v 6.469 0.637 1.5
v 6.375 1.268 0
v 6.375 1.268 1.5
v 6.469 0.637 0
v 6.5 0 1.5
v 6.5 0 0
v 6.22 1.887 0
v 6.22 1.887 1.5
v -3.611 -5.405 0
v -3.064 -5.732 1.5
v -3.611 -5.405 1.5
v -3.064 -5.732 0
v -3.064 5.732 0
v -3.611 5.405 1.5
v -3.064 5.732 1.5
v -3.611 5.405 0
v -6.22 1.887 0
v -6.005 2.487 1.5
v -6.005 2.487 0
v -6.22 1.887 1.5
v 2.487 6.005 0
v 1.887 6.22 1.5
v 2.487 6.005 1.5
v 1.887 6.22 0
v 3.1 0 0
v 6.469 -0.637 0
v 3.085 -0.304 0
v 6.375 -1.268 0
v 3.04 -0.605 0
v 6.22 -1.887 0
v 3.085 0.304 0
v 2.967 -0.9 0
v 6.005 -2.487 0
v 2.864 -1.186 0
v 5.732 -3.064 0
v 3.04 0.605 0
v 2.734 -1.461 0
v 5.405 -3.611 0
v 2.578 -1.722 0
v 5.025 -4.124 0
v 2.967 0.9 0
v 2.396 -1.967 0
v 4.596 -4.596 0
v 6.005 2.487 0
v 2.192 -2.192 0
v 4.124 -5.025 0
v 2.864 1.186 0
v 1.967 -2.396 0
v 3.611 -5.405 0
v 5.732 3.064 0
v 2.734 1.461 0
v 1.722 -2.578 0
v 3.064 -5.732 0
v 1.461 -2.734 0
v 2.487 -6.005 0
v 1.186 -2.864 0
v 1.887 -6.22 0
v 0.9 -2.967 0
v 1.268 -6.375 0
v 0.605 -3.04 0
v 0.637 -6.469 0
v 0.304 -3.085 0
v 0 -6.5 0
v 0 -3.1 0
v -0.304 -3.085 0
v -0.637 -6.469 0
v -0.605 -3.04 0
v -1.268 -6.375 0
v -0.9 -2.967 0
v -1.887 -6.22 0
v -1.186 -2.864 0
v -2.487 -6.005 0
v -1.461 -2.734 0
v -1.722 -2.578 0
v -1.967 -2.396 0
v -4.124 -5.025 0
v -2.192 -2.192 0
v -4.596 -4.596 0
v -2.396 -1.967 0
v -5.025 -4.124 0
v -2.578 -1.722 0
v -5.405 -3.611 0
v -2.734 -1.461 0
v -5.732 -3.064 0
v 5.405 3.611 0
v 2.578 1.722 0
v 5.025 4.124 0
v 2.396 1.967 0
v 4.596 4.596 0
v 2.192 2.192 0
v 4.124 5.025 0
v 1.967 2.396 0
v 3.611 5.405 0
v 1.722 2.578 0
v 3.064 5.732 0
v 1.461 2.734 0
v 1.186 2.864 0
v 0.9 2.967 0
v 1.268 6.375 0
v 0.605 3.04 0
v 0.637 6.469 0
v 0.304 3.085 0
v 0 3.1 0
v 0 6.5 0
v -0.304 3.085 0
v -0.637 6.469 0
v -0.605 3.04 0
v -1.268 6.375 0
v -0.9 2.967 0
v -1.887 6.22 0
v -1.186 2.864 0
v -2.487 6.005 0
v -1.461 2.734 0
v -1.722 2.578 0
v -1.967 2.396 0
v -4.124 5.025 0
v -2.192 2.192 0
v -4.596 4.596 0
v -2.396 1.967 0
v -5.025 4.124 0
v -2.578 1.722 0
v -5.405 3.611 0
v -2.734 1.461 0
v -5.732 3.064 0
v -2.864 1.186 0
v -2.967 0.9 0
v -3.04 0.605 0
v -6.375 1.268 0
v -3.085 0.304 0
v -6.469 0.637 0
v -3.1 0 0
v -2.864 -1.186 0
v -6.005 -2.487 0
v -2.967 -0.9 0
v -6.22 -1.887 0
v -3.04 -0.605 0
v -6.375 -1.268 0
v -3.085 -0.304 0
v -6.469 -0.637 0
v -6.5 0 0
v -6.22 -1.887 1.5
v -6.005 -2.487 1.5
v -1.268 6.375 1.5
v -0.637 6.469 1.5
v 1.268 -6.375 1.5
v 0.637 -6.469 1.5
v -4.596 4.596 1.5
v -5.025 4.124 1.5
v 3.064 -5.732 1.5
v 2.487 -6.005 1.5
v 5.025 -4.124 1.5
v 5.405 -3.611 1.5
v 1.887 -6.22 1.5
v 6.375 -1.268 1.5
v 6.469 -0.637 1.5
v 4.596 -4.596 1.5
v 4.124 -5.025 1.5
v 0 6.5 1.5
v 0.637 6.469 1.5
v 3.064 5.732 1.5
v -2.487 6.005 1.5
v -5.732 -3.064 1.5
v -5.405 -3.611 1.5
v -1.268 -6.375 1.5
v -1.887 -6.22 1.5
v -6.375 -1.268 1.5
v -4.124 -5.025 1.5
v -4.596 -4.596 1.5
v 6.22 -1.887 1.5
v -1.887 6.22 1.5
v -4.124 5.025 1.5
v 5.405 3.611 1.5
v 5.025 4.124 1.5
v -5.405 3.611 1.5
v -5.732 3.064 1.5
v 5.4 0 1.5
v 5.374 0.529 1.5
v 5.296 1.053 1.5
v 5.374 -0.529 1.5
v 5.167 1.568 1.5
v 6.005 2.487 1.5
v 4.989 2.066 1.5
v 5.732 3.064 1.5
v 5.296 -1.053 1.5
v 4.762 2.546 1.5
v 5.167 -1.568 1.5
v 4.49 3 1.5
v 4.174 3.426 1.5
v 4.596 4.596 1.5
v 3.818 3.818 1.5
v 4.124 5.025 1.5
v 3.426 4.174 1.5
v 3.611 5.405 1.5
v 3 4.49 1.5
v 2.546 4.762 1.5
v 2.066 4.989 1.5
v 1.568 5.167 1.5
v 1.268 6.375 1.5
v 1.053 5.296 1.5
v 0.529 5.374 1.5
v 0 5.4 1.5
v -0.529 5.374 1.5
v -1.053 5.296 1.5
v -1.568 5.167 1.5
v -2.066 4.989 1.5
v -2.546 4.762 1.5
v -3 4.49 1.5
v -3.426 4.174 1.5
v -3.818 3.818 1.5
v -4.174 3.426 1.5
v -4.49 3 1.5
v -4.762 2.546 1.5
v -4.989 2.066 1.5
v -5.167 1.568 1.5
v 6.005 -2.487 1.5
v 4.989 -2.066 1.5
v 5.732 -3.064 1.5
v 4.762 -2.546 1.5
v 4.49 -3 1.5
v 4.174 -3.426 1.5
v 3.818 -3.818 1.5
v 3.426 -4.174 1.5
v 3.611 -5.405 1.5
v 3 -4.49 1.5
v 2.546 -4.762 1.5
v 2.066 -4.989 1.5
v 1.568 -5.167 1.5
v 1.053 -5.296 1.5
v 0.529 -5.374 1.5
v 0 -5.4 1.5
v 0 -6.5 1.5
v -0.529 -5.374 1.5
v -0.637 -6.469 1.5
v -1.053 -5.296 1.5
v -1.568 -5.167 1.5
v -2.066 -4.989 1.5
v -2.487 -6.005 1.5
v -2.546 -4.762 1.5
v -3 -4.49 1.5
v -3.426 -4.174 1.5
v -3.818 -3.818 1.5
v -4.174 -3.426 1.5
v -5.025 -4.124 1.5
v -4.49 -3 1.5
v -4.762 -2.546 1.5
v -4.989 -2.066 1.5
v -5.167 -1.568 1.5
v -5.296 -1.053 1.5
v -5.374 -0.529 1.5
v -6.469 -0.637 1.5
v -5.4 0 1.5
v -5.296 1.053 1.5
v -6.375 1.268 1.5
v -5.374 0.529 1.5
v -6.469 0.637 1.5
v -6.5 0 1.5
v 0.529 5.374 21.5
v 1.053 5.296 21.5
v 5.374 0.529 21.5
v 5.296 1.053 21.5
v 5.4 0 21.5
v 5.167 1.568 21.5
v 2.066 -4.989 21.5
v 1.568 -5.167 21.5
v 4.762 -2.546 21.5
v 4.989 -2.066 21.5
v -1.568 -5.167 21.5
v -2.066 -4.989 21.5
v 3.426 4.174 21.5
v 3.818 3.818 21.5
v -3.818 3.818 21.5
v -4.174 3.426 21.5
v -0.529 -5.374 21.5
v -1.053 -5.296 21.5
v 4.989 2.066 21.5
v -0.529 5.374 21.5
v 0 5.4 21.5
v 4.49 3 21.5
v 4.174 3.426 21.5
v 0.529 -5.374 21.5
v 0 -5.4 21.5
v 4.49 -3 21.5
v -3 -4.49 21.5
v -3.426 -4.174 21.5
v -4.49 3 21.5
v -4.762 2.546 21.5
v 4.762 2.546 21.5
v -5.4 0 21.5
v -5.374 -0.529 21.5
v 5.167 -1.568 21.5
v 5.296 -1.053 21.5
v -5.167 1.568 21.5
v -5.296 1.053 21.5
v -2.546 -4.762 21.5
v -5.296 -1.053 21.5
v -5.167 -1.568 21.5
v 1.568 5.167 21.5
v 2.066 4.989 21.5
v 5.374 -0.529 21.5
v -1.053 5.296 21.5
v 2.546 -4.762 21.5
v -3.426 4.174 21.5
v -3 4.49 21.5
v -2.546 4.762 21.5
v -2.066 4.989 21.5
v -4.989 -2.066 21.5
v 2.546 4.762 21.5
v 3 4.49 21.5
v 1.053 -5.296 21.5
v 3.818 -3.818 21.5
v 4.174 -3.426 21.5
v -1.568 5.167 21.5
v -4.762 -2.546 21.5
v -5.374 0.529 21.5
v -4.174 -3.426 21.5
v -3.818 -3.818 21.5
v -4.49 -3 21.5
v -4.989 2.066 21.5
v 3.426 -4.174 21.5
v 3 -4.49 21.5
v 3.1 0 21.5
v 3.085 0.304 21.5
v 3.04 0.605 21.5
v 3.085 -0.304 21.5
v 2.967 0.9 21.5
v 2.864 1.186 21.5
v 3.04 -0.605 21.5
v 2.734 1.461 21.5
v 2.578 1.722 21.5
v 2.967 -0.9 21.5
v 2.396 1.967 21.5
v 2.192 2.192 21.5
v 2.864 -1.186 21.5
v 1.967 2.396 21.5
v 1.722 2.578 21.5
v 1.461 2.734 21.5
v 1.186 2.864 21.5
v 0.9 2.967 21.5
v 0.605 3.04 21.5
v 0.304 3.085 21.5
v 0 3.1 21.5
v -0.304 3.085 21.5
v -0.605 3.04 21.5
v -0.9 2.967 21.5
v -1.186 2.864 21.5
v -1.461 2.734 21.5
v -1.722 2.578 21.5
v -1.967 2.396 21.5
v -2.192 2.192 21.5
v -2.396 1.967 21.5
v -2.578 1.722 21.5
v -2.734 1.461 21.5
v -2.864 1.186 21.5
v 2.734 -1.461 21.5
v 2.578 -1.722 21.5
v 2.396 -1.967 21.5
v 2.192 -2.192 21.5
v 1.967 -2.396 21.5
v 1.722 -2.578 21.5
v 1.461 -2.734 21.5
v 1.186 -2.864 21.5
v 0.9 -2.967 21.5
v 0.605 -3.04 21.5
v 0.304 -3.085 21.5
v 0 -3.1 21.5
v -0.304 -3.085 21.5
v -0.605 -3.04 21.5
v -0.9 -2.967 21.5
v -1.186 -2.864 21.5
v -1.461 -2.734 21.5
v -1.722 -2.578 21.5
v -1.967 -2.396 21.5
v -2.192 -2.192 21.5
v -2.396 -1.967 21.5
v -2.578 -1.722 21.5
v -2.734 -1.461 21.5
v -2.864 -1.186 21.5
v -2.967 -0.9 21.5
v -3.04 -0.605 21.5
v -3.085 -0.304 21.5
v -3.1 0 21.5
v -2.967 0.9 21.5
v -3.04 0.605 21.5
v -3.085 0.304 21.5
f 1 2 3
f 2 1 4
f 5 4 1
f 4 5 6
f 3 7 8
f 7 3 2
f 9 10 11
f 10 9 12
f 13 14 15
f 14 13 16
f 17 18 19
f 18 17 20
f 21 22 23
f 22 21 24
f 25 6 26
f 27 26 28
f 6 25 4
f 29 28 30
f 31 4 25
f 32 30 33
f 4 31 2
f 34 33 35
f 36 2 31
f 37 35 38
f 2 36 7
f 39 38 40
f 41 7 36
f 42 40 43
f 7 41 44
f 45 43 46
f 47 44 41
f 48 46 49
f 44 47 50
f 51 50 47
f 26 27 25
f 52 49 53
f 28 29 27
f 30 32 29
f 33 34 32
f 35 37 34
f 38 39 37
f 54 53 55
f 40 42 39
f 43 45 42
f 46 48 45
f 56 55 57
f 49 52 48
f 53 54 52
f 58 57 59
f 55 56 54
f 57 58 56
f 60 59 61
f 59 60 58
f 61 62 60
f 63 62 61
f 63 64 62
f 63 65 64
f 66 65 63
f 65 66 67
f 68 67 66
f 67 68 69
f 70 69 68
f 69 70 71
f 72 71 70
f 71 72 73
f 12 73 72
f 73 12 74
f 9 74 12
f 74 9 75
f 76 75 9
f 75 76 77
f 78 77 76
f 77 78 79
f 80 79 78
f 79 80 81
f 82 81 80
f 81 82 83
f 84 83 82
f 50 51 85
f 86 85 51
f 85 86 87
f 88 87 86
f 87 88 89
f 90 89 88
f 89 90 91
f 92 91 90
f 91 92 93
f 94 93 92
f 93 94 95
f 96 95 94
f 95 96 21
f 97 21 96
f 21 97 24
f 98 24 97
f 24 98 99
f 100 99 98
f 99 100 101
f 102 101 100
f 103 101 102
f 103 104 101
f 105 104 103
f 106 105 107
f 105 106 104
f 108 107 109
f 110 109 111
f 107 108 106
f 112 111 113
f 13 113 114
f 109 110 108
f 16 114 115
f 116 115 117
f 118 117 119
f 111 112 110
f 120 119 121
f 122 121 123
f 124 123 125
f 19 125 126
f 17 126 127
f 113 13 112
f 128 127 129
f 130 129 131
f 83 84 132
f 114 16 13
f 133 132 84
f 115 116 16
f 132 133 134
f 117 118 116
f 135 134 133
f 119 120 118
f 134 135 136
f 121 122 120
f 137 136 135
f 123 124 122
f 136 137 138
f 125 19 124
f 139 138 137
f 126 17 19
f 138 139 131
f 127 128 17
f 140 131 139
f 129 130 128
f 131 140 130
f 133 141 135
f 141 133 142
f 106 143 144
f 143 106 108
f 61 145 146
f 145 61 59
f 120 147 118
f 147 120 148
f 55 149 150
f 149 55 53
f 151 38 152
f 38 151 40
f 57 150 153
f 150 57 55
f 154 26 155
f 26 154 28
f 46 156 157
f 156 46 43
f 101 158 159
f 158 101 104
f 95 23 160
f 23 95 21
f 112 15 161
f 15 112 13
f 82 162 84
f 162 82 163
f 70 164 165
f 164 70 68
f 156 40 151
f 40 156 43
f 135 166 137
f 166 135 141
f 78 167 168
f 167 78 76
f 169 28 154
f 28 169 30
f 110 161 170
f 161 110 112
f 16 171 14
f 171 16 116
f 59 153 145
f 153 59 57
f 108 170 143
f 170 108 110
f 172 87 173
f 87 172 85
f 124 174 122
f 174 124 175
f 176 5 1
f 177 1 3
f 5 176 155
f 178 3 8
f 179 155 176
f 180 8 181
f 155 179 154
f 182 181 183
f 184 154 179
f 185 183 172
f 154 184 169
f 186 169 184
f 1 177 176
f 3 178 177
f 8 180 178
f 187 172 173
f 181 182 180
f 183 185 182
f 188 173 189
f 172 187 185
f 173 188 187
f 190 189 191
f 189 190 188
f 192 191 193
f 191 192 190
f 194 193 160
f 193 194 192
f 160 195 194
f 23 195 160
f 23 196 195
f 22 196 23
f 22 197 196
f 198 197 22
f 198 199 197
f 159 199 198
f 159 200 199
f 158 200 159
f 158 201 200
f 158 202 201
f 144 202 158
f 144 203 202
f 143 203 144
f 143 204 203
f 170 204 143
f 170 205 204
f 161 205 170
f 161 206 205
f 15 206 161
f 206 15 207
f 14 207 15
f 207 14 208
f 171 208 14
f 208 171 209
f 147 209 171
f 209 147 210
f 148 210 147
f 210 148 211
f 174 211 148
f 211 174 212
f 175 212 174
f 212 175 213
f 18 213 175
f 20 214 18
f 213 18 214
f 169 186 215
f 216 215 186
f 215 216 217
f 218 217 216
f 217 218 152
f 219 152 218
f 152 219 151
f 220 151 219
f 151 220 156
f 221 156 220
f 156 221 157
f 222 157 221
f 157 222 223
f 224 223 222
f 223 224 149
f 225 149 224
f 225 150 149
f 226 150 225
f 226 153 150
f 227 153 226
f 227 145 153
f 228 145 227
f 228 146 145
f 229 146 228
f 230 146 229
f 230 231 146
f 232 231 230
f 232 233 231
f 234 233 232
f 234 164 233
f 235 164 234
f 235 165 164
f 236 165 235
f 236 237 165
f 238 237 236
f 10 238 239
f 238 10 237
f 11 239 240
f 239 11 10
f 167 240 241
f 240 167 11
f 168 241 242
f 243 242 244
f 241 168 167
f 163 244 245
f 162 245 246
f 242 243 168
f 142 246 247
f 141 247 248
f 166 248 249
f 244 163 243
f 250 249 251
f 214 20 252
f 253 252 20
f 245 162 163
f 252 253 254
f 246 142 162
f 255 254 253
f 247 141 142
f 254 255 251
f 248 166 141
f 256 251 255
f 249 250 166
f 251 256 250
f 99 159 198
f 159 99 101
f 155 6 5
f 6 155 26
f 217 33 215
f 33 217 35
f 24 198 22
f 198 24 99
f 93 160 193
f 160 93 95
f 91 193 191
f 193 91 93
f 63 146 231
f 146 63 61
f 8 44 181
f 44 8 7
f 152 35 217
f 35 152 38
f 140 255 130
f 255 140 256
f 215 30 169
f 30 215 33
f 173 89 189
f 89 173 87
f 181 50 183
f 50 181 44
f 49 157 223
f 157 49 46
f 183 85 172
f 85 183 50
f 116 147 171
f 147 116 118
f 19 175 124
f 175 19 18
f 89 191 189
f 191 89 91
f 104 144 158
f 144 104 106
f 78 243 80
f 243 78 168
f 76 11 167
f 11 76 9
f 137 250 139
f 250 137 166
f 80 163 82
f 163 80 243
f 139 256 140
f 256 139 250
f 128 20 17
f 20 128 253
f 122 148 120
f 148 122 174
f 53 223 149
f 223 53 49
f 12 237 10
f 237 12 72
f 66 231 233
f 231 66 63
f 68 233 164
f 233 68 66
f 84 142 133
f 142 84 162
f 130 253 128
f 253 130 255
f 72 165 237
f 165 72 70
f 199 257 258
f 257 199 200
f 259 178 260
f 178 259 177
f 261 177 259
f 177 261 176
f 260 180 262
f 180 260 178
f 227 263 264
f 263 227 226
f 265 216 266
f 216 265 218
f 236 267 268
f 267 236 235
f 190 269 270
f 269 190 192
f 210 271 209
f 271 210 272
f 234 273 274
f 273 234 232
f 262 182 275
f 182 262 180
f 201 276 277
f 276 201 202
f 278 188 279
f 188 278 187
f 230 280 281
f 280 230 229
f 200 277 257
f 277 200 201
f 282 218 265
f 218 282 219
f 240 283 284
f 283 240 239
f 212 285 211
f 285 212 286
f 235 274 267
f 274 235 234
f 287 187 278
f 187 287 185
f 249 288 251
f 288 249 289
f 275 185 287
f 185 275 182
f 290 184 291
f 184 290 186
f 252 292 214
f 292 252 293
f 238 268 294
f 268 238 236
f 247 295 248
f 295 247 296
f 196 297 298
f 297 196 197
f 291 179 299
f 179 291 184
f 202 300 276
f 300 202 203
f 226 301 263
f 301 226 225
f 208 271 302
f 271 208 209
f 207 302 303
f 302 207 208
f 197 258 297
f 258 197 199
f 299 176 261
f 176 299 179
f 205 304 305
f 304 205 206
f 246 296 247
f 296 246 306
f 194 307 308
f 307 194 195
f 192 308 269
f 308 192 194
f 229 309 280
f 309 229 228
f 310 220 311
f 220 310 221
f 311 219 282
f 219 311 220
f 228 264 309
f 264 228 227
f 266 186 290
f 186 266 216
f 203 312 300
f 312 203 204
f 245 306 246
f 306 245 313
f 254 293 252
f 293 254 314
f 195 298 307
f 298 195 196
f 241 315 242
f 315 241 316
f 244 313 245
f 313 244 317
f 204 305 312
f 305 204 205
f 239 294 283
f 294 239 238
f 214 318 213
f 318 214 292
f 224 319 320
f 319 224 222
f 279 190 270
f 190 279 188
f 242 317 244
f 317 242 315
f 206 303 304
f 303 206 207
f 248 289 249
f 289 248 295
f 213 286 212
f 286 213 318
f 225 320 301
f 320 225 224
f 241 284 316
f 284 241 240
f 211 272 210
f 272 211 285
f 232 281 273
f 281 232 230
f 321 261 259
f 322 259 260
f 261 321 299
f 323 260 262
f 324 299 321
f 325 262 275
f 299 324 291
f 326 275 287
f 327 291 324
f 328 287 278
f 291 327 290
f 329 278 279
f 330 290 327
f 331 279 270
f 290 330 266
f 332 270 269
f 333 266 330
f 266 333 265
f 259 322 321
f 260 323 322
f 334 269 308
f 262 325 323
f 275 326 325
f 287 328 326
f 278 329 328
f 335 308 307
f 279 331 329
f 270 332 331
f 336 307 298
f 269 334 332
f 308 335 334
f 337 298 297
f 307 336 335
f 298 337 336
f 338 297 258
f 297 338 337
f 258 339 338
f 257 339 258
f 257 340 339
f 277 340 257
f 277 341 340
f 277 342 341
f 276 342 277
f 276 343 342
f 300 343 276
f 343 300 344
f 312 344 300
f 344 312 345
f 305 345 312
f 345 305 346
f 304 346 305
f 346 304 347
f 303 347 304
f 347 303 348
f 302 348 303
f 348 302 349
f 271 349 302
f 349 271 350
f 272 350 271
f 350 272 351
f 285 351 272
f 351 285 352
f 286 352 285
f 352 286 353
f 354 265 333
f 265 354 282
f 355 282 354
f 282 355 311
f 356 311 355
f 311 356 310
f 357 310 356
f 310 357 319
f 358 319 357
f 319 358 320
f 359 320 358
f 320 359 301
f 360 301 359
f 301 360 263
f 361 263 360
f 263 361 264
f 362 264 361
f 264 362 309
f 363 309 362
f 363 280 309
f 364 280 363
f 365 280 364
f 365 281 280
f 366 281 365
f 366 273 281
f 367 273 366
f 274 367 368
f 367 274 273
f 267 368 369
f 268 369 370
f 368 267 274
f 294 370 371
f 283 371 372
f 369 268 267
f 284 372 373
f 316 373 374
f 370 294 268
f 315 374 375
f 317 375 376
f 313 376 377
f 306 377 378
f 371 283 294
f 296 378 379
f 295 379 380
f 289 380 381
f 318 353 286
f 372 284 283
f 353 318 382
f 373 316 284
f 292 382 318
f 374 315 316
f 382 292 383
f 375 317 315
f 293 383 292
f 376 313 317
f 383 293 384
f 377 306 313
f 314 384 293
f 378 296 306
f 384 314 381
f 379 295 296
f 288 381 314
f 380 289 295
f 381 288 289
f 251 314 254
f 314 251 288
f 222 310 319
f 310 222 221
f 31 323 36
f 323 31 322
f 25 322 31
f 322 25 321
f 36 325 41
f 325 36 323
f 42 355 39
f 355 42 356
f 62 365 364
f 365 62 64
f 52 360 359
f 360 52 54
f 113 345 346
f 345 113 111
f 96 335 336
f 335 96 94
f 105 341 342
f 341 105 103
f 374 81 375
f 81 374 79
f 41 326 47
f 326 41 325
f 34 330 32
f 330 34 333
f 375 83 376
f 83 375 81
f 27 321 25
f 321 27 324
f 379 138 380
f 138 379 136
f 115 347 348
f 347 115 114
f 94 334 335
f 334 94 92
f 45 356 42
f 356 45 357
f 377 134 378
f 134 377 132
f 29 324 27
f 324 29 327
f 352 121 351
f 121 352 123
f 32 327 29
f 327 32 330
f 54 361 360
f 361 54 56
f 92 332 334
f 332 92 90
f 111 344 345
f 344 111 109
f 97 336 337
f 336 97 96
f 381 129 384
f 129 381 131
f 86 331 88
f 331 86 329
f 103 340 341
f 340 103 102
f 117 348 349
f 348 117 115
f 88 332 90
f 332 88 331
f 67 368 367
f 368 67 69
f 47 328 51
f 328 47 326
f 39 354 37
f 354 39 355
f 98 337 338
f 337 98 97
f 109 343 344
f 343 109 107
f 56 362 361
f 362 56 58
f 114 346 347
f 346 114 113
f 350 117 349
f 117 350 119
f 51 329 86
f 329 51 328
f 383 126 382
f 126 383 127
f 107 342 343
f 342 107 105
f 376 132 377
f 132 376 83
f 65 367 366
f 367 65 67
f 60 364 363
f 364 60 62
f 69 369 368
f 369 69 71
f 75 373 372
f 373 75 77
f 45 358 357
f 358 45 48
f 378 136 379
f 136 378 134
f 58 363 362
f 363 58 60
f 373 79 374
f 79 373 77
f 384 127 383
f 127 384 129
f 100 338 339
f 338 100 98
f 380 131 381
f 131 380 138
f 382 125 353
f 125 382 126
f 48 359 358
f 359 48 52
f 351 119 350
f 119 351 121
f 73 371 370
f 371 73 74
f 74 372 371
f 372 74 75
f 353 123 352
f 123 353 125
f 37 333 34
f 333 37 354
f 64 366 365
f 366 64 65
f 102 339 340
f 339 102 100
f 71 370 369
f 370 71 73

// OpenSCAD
// Adapter sleeve: 0.2 mL PCR tube in a 1.5 mL rack hole
// Print orientation: collar on bed (z = 0), sleeve body rises to z = 21.5

$fn = 64;

// --- Dimensions (mm) ---
collar_d      = 13;    // collar outer diameter
collar_h      = 1.5;   // collar thickness
sleeve_od     = 10.8;  // sleeve body outer diameter
sleeve_h      = 20;    // sleeve body height (z = 1.5 to 21.5)
bore_d        = 6.2;   // through-bore diameter
eps           = 0.5;   // cutter overshoot past faces

total_h = collar_h + sleeve_h; // 21.5 mm overall height

difference() {
    union() {
        // Collar
        cylinder(d = collar_d, h = collar_h);
        // Sleeve body (slightly overlapping the collar for a clean union)
        translate([0, 0, collar_h - 0.01])
            cylinder(d = sleeve_od, h = sleeve_h + 0.01);
    }
    // Straight through-bore
    translate([0, 0, -eps])
        cylinder(d = bore_d, h = total_h + 2 * eps);
}
